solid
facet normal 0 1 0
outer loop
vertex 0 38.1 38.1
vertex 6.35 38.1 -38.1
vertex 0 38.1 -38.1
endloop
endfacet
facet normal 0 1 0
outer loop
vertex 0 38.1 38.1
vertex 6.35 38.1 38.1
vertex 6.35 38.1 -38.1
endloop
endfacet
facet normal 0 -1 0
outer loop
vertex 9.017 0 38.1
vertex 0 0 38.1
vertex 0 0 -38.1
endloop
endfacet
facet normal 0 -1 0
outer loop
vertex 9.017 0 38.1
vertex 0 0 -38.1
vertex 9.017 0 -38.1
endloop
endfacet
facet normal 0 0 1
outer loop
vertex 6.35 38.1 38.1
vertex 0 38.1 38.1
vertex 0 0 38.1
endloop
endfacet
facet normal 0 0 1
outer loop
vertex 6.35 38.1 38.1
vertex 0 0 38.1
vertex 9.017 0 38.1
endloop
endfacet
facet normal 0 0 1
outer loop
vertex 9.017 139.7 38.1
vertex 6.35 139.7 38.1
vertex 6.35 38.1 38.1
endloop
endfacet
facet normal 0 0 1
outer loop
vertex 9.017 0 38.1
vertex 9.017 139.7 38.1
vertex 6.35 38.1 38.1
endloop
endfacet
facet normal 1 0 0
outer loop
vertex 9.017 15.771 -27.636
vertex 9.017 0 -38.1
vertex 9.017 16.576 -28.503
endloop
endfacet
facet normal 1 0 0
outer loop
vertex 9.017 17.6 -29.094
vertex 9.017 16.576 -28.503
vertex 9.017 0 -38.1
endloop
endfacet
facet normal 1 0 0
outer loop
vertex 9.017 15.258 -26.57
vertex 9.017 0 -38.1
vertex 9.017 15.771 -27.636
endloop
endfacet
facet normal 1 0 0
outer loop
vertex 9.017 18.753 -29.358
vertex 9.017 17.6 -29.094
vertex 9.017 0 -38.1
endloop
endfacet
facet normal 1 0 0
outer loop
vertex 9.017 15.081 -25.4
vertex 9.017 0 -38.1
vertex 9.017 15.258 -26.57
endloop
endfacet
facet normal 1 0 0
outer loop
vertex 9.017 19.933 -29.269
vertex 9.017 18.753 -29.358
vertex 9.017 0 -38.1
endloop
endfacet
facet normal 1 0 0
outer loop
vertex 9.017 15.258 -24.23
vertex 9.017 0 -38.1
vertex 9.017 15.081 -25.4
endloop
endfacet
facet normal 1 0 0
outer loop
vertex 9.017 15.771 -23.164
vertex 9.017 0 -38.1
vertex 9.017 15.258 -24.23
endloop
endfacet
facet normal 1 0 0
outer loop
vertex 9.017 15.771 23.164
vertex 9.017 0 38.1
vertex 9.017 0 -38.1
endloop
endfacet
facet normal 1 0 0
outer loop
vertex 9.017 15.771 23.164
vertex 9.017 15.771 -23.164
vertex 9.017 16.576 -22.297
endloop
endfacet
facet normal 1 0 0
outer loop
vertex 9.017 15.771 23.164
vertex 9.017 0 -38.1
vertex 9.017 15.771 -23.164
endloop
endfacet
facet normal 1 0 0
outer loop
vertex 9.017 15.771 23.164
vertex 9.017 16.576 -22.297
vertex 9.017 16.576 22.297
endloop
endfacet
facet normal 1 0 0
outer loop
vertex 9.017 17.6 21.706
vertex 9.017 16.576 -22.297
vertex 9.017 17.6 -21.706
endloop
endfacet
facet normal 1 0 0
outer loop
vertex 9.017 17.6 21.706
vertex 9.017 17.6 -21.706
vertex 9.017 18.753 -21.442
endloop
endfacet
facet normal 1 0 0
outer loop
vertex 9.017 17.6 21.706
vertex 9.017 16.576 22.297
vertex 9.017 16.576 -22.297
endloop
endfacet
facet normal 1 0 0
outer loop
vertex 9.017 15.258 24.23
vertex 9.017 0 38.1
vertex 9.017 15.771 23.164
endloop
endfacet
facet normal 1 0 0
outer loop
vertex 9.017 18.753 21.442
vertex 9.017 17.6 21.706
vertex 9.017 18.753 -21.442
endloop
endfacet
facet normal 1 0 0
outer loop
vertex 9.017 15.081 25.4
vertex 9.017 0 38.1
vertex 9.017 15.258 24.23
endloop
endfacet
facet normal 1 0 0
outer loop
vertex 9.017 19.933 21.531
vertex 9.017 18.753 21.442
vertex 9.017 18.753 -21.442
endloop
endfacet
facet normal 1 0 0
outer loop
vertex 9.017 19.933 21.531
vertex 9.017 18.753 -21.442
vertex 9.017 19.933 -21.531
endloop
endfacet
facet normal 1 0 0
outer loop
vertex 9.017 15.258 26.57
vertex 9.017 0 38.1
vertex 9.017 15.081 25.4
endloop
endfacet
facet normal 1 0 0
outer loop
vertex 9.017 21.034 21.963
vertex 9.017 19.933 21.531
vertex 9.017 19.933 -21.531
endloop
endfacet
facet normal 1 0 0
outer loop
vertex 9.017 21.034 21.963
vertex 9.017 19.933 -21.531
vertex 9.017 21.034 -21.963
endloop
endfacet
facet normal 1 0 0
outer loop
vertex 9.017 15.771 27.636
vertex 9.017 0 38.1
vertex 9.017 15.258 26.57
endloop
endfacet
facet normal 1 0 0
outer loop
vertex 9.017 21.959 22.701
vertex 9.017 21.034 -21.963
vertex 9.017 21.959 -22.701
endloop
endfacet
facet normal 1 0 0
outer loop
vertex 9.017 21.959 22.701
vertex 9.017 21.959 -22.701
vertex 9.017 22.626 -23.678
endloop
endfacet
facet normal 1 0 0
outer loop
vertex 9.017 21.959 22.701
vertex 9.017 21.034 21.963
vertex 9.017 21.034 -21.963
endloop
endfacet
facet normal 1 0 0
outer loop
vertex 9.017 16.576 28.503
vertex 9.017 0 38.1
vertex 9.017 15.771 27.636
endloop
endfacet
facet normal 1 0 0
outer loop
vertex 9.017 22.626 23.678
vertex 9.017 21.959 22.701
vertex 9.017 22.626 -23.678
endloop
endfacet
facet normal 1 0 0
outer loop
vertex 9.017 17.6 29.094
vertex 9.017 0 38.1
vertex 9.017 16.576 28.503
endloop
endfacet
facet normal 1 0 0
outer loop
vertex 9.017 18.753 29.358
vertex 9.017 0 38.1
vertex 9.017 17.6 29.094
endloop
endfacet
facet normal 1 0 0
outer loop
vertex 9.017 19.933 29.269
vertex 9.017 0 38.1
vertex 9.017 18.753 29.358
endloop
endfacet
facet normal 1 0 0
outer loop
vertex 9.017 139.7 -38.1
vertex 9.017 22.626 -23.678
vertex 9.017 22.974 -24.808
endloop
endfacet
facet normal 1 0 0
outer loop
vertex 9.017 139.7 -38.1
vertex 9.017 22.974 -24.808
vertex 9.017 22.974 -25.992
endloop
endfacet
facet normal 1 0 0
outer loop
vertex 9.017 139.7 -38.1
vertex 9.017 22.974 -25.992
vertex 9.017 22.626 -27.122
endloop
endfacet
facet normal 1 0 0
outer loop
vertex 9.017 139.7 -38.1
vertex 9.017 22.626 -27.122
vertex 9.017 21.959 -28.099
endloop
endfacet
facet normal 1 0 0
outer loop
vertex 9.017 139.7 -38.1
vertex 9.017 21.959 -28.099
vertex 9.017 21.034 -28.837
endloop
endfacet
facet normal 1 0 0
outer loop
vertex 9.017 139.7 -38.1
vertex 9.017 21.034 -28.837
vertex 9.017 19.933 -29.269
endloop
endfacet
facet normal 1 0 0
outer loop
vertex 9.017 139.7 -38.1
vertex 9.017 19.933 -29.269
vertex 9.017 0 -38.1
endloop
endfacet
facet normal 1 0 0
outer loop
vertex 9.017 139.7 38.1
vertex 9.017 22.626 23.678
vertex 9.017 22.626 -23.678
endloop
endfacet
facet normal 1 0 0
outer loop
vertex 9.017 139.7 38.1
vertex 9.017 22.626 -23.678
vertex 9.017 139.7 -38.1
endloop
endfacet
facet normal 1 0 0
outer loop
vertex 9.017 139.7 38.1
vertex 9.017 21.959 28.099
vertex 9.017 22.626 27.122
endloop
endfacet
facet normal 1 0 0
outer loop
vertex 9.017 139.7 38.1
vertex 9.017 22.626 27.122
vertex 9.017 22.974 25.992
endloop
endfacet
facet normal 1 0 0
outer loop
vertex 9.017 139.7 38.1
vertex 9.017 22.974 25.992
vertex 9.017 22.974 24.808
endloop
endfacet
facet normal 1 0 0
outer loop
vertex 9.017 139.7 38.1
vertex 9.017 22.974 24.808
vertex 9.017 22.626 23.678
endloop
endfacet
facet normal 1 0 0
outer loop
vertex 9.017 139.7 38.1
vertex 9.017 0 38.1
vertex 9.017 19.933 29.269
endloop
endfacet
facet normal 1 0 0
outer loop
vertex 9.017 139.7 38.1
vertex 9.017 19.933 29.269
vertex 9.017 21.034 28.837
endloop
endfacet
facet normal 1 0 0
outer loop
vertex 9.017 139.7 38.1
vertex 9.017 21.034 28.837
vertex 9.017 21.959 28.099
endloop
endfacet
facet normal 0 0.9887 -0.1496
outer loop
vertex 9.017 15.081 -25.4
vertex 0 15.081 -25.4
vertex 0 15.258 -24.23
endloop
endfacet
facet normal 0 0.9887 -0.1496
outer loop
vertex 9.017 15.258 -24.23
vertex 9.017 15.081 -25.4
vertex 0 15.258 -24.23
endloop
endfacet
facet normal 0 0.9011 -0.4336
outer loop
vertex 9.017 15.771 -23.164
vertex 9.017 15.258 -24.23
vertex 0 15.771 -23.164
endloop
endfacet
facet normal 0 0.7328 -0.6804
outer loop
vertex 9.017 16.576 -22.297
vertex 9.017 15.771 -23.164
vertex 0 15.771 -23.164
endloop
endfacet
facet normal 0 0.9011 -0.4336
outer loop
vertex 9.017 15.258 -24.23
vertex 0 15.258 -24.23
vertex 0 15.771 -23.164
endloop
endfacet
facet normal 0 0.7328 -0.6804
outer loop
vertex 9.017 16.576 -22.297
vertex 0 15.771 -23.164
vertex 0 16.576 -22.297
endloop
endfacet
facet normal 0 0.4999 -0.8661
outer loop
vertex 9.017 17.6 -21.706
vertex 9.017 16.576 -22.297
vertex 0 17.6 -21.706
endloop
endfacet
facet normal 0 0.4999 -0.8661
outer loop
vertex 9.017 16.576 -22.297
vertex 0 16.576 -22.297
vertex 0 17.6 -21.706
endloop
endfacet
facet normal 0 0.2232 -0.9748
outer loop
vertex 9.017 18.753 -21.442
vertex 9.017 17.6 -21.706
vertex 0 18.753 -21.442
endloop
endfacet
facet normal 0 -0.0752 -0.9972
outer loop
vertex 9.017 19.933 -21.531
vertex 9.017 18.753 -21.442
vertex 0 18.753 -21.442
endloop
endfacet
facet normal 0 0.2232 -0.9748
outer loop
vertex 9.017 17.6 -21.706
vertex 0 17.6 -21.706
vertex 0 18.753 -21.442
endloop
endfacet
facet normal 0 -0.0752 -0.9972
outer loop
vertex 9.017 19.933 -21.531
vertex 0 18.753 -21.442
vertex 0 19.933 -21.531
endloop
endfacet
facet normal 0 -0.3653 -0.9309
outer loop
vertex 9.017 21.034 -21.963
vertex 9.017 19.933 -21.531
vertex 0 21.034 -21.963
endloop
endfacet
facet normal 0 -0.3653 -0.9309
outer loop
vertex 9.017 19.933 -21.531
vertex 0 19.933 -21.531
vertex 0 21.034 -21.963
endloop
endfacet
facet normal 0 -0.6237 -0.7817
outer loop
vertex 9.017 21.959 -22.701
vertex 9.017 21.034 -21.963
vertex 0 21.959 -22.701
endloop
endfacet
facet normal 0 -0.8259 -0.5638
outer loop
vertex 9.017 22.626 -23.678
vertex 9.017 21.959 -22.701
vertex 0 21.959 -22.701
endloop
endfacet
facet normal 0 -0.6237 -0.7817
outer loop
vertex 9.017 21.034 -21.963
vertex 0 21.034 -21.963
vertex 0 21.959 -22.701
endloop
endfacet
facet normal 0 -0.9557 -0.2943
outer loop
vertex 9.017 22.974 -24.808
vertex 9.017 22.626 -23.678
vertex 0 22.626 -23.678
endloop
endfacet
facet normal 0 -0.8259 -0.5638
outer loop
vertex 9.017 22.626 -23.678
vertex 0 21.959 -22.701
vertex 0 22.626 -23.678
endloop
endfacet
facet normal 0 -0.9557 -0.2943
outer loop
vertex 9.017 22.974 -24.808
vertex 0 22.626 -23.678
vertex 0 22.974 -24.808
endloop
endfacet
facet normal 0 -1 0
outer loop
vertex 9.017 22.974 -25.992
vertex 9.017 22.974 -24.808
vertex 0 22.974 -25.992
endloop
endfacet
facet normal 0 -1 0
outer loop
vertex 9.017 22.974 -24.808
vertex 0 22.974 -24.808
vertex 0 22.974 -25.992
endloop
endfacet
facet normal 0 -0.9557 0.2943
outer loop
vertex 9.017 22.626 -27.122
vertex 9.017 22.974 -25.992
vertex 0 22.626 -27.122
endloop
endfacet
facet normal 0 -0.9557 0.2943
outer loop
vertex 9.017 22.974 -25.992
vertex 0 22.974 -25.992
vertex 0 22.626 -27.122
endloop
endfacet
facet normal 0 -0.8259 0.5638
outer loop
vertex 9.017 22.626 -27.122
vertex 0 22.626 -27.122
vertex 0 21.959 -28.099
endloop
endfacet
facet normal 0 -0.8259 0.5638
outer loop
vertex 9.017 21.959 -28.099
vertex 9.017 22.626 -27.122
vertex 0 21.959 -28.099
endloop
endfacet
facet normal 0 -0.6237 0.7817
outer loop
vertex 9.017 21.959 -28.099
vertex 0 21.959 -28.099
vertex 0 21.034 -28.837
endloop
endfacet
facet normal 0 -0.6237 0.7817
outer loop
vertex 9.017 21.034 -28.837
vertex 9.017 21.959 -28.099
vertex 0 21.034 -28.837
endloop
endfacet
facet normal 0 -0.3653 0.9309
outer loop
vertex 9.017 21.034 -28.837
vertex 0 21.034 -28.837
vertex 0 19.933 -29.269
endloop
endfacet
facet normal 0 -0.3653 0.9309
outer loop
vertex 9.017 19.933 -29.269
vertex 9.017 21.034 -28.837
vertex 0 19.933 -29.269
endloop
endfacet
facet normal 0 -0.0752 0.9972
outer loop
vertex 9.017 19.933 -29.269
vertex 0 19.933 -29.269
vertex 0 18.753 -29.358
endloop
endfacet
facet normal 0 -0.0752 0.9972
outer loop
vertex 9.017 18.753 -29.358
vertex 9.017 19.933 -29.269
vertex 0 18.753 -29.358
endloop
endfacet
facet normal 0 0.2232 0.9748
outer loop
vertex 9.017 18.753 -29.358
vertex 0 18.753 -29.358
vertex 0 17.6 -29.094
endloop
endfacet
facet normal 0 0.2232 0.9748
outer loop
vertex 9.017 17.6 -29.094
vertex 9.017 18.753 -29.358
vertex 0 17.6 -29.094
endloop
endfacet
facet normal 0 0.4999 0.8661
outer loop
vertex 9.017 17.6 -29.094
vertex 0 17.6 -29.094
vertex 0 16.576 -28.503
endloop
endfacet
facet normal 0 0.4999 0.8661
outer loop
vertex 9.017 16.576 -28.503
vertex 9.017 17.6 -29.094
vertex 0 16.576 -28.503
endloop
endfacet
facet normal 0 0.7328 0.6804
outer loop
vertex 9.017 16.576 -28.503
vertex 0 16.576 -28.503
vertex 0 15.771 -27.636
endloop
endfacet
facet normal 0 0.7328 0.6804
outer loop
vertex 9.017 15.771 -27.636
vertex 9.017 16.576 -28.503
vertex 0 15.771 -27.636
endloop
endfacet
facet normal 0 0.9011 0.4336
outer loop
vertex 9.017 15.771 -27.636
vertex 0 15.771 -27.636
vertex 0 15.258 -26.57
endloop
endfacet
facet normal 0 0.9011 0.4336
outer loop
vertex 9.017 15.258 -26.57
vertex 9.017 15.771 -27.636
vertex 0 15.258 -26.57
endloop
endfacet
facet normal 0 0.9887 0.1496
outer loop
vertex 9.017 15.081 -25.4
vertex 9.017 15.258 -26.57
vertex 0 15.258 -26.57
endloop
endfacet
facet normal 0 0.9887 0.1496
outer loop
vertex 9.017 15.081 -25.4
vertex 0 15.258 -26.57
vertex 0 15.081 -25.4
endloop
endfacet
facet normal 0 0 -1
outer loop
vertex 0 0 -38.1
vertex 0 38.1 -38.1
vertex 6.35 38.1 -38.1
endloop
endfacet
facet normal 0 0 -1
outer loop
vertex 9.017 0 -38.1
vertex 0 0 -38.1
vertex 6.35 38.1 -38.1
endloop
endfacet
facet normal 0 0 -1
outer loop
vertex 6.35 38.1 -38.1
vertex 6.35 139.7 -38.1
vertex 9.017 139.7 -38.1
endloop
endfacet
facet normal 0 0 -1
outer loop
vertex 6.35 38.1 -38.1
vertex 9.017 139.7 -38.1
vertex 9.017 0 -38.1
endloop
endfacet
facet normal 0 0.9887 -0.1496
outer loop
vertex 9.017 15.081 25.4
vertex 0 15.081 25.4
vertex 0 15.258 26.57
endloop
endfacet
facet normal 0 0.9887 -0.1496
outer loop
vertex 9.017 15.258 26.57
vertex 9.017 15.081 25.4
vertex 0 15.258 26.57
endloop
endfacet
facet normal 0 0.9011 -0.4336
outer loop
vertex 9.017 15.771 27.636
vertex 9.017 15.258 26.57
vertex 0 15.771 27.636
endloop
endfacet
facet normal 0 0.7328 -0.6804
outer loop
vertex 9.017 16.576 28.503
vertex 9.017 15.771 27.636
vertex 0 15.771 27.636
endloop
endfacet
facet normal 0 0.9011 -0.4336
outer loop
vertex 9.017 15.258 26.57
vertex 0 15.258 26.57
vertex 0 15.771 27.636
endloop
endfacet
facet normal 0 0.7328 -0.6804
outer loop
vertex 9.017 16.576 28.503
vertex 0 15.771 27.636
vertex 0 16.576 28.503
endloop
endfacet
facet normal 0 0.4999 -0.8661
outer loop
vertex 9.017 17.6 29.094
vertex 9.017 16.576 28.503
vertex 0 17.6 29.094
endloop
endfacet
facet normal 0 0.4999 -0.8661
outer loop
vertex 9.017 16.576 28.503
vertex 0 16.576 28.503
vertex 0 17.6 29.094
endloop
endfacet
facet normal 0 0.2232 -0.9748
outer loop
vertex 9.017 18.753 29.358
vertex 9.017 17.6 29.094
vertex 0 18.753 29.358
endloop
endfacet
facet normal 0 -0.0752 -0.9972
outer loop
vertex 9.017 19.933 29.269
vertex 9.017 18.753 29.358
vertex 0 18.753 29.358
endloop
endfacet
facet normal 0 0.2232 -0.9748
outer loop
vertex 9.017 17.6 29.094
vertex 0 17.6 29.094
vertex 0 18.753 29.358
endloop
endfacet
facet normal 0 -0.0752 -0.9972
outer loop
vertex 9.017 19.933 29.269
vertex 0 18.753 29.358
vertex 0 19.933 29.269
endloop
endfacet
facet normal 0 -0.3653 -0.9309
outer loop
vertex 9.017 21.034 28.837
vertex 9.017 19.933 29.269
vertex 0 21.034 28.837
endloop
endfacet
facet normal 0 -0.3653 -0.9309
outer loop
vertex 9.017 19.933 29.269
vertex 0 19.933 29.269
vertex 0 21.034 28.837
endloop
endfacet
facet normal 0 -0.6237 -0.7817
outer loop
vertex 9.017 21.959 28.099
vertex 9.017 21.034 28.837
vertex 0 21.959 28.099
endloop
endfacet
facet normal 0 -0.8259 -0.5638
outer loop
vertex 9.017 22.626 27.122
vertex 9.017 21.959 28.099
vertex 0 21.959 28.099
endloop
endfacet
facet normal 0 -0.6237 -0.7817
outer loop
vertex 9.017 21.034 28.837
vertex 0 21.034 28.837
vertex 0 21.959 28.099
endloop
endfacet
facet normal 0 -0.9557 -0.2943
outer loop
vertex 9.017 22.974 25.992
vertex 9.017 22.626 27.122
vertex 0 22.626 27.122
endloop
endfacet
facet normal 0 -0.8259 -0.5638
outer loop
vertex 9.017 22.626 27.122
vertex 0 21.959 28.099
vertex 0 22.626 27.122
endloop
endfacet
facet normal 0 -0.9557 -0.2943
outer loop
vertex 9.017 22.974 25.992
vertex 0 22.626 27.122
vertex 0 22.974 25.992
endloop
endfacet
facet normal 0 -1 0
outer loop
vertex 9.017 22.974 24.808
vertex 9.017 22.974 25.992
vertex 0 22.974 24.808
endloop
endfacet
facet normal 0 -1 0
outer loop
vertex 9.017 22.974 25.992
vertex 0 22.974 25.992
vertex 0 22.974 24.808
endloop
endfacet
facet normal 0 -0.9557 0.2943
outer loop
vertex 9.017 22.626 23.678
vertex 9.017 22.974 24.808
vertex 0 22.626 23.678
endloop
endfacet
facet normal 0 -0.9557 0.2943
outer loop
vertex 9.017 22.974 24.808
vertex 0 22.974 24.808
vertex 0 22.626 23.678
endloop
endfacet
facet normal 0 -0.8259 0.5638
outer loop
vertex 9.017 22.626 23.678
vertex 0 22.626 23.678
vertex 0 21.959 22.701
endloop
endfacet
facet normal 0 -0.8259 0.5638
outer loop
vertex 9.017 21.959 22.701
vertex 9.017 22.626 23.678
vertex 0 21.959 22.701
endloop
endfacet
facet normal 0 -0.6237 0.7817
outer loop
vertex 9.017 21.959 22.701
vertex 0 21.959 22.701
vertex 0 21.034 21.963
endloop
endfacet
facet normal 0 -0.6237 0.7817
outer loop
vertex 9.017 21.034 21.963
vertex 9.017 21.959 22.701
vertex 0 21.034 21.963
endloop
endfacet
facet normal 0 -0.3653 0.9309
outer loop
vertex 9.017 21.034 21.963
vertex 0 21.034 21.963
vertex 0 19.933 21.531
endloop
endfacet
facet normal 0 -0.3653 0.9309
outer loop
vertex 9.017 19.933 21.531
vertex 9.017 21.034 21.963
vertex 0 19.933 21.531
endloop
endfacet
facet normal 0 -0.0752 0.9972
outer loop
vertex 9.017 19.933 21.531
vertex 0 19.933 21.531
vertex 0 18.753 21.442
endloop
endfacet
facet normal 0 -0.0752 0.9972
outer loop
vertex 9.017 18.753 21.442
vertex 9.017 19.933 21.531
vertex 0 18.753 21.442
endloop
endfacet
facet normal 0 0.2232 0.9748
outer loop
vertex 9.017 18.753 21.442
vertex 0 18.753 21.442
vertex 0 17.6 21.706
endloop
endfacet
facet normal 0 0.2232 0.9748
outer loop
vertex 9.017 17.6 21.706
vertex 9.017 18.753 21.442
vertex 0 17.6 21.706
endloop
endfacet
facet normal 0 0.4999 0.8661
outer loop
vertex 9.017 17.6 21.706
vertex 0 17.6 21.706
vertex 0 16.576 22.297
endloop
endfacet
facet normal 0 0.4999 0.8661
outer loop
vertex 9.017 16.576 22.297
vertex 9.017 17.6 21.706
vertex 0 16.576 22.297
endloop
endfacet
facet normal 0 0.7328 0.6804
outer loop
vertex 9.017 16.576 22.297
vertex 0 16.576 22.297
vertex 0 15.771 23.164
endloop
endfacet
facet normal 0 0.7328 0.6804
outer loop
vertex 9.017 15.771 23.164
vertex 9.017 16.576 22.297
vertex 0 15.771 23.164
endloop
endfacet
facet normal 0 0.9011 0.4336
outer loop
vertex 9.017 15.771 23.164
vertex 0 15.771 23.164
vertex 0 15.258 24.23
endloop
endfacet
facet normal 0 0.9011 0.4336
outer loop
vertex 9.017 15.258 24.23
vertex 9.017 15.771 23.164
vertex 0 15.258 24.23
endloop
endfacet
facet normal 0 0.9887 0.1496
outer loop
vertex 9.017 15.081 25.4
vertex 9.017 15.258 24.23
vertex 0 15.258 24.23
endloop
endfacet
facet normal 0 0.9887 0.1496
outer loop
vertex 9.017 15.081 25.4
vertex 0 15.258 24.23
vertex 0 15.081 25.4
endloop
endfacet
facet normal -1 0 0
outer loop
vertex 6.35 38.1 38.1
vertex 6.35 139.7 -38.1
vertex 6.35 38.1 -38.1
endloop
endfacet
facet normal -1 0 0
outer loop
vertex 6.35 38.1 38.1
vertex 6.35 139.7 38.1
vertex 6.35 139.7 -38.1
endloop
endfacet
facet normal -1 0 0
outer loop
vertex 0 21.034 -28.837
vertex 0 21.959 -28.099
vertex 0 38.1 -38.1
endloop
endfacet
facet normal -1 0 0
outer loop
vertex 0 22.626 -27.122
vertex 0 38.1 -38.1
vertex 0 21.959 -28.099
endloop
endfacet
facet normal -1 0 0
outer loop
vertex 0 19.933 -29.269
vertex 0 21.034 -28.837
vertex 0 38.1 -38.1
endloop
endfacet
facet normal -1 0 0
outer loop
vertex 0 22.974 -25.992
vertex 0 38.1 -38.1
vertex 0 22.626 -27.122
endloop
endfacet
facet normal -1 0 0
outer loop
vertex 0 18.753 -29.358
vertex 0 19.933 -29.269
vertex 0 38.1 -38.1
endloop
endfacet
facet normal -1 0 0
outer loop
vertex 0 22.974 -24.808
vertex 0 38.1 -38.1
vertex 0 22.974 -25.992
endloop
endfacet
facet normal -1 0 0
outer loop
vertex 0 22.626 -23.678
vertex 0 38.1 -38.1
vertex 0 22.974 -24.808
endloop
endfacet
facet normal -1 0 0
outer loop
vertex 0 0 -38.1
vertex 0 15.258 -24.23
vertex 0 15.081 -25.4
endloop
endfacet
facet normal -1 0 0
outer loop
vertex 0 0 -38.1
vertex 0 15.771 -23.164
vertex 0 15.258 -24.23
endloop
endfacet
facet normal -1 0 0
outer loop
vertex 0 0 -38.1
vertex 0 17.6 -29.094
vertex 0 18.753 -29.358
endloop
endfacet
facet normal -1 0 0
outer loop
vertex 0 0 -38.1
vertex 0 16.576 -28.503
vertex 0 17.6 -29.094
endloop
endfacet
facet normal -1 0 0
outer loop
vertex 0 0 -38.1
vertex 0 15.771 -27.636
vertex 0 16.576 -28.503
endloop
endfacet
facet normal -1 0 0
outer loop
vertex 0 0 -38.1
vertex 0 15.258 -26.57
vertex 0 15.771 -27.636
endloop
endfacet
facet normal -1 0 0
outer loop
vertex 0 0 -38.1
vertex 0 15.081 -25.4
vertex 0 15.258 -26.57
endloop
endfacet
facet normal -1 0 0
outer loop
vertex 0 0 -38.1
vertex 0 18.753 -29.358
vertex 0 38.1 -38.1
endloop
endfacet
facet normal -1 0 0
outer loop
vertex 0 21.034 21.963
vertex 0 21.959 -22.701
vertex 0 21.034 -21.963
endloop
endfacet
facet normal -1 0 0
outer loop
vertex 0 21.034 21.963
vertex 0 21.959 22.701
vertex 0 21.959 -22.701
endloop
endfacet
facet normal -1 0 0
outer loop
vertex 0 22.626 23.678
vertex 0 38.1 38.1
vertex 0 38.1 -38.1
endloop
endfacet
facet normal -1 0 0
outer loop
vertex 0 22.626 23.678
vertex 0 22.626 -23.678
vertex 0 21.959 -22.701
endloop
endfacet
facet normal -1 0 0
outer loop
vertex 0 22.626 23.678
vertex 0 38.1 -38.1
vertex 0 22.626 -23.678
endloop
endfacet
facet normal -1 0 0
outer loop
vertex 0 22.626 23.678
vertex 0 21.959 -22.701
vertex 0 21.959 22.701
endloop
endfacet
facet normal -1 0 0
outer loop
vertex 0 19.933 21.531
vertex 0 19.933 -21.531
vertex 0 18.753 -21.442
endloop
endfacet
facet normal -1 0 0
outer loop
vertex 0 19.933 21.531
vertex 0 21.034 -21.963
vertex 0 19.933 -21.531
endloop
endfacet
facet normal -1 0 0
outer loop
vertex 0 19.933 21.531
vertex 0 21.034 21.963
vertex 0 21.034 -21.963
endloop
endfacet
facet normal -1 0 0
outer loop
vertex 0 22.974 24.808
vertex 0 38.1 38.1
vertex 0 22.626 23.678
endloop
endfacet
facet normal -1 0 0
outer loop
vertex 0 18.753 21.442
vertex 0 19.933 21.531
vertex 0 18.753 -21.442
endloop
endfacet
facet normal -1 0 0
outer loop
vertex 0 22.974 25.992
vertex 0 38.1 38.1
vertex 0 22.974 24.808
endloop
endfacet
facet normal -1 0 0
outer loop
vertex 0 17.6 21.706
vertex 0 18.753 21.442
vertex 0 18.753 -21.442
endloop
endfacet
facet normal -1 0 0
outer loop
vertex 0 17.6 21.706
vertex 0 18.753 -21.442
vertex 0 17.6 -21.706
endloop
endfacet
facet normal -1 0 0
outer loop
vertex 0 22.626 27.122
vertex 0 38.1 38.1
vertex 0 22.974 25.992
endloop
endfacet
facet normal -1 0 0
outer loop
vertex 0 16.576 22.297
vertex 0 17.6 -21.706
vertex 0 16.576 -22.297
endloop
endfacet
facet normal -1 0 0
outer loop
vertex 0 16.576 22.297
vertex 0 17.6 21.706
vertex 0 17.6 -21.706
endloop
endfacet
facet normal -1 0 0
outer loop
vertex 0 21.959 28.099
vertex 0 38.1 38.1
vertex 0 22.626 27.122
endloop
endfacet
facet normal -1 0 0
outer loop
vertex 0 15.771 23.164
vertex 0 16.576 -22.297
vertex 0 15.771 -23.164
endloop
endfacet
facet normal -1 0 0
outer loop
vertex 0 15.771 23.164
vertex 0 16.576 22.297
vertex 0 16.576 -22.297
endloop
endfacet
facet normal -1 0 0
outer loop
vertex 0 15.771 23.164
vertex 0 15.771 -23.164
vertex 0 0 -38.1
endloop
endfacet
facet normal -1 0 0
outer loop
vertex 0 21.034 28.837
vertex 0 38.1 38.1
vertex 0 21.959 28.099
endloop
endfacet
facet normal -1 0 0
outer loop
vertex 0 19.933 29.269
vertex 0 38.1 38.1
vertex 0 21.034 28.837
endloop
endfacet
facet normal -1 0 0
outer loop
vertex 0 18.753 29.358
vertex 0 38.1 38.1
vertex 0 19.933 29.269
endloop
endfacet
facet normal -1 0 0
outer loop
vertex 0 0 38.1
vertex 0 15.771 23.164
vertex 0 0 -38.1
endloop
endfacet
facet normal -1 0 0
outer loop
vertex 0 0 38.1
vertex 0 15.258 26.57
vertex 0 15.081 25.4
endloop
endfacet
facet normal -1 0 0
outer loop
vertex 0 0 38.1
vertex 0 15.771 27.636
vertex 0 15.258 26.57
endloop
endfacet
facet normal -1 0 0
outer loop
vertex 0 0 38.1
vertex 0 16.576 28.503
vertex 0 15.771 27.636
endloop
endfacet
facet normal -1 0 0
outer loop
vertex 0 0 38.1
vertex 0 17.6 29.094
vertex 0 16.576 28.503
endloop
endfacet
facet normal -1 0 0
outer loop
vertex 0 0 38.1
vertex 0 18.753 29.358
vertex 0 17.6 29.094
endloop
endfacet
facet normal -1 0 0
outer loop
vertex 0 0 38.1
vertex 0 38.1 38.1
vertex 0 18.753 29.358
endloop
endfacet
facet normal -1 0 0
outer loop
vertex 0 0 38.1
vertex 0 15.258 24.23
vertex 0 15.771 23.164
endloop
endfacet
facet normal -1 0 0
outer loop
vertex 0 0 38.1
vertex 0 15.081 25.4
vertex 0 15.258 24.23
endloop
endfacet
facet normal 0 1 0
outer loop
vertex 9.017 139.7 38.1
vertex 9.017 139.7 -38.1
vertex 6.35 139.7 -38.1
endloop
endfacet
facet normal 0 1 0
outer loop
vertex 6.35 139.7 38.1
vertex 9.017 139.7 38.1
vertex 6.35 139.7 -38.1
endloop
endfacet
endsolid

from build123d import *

# Parameters (mm, degrees)
F1_DEPTH = 38.1
F3_D     = 7.9375


# Not quite as in the source:
# - a length typed as a fraction of an inch, garbled in the dataset ("3 / 203.2 mm" for 3/8 in), is restored


with BuildPart() as f1:
    # F0 (on Top) → F1 (new body, symmetric)
    with BuildSketch(Plane.XY):
        Polygon((0, 38.1), (0, 0), (9.017, 0), (9.017, 139.7), (6.35, 139.7), (6.35, 38.1), align=None)
    extrude(amount=F1_DEPTH, both=True)

    # F3 (through all)
    with Locations(Plane.YZ.offset(9.017)):
        with Locations((19.05, 25.4), (19.05, -25.4)):
            Hole(F3_D / 2)


solid = f1.part
